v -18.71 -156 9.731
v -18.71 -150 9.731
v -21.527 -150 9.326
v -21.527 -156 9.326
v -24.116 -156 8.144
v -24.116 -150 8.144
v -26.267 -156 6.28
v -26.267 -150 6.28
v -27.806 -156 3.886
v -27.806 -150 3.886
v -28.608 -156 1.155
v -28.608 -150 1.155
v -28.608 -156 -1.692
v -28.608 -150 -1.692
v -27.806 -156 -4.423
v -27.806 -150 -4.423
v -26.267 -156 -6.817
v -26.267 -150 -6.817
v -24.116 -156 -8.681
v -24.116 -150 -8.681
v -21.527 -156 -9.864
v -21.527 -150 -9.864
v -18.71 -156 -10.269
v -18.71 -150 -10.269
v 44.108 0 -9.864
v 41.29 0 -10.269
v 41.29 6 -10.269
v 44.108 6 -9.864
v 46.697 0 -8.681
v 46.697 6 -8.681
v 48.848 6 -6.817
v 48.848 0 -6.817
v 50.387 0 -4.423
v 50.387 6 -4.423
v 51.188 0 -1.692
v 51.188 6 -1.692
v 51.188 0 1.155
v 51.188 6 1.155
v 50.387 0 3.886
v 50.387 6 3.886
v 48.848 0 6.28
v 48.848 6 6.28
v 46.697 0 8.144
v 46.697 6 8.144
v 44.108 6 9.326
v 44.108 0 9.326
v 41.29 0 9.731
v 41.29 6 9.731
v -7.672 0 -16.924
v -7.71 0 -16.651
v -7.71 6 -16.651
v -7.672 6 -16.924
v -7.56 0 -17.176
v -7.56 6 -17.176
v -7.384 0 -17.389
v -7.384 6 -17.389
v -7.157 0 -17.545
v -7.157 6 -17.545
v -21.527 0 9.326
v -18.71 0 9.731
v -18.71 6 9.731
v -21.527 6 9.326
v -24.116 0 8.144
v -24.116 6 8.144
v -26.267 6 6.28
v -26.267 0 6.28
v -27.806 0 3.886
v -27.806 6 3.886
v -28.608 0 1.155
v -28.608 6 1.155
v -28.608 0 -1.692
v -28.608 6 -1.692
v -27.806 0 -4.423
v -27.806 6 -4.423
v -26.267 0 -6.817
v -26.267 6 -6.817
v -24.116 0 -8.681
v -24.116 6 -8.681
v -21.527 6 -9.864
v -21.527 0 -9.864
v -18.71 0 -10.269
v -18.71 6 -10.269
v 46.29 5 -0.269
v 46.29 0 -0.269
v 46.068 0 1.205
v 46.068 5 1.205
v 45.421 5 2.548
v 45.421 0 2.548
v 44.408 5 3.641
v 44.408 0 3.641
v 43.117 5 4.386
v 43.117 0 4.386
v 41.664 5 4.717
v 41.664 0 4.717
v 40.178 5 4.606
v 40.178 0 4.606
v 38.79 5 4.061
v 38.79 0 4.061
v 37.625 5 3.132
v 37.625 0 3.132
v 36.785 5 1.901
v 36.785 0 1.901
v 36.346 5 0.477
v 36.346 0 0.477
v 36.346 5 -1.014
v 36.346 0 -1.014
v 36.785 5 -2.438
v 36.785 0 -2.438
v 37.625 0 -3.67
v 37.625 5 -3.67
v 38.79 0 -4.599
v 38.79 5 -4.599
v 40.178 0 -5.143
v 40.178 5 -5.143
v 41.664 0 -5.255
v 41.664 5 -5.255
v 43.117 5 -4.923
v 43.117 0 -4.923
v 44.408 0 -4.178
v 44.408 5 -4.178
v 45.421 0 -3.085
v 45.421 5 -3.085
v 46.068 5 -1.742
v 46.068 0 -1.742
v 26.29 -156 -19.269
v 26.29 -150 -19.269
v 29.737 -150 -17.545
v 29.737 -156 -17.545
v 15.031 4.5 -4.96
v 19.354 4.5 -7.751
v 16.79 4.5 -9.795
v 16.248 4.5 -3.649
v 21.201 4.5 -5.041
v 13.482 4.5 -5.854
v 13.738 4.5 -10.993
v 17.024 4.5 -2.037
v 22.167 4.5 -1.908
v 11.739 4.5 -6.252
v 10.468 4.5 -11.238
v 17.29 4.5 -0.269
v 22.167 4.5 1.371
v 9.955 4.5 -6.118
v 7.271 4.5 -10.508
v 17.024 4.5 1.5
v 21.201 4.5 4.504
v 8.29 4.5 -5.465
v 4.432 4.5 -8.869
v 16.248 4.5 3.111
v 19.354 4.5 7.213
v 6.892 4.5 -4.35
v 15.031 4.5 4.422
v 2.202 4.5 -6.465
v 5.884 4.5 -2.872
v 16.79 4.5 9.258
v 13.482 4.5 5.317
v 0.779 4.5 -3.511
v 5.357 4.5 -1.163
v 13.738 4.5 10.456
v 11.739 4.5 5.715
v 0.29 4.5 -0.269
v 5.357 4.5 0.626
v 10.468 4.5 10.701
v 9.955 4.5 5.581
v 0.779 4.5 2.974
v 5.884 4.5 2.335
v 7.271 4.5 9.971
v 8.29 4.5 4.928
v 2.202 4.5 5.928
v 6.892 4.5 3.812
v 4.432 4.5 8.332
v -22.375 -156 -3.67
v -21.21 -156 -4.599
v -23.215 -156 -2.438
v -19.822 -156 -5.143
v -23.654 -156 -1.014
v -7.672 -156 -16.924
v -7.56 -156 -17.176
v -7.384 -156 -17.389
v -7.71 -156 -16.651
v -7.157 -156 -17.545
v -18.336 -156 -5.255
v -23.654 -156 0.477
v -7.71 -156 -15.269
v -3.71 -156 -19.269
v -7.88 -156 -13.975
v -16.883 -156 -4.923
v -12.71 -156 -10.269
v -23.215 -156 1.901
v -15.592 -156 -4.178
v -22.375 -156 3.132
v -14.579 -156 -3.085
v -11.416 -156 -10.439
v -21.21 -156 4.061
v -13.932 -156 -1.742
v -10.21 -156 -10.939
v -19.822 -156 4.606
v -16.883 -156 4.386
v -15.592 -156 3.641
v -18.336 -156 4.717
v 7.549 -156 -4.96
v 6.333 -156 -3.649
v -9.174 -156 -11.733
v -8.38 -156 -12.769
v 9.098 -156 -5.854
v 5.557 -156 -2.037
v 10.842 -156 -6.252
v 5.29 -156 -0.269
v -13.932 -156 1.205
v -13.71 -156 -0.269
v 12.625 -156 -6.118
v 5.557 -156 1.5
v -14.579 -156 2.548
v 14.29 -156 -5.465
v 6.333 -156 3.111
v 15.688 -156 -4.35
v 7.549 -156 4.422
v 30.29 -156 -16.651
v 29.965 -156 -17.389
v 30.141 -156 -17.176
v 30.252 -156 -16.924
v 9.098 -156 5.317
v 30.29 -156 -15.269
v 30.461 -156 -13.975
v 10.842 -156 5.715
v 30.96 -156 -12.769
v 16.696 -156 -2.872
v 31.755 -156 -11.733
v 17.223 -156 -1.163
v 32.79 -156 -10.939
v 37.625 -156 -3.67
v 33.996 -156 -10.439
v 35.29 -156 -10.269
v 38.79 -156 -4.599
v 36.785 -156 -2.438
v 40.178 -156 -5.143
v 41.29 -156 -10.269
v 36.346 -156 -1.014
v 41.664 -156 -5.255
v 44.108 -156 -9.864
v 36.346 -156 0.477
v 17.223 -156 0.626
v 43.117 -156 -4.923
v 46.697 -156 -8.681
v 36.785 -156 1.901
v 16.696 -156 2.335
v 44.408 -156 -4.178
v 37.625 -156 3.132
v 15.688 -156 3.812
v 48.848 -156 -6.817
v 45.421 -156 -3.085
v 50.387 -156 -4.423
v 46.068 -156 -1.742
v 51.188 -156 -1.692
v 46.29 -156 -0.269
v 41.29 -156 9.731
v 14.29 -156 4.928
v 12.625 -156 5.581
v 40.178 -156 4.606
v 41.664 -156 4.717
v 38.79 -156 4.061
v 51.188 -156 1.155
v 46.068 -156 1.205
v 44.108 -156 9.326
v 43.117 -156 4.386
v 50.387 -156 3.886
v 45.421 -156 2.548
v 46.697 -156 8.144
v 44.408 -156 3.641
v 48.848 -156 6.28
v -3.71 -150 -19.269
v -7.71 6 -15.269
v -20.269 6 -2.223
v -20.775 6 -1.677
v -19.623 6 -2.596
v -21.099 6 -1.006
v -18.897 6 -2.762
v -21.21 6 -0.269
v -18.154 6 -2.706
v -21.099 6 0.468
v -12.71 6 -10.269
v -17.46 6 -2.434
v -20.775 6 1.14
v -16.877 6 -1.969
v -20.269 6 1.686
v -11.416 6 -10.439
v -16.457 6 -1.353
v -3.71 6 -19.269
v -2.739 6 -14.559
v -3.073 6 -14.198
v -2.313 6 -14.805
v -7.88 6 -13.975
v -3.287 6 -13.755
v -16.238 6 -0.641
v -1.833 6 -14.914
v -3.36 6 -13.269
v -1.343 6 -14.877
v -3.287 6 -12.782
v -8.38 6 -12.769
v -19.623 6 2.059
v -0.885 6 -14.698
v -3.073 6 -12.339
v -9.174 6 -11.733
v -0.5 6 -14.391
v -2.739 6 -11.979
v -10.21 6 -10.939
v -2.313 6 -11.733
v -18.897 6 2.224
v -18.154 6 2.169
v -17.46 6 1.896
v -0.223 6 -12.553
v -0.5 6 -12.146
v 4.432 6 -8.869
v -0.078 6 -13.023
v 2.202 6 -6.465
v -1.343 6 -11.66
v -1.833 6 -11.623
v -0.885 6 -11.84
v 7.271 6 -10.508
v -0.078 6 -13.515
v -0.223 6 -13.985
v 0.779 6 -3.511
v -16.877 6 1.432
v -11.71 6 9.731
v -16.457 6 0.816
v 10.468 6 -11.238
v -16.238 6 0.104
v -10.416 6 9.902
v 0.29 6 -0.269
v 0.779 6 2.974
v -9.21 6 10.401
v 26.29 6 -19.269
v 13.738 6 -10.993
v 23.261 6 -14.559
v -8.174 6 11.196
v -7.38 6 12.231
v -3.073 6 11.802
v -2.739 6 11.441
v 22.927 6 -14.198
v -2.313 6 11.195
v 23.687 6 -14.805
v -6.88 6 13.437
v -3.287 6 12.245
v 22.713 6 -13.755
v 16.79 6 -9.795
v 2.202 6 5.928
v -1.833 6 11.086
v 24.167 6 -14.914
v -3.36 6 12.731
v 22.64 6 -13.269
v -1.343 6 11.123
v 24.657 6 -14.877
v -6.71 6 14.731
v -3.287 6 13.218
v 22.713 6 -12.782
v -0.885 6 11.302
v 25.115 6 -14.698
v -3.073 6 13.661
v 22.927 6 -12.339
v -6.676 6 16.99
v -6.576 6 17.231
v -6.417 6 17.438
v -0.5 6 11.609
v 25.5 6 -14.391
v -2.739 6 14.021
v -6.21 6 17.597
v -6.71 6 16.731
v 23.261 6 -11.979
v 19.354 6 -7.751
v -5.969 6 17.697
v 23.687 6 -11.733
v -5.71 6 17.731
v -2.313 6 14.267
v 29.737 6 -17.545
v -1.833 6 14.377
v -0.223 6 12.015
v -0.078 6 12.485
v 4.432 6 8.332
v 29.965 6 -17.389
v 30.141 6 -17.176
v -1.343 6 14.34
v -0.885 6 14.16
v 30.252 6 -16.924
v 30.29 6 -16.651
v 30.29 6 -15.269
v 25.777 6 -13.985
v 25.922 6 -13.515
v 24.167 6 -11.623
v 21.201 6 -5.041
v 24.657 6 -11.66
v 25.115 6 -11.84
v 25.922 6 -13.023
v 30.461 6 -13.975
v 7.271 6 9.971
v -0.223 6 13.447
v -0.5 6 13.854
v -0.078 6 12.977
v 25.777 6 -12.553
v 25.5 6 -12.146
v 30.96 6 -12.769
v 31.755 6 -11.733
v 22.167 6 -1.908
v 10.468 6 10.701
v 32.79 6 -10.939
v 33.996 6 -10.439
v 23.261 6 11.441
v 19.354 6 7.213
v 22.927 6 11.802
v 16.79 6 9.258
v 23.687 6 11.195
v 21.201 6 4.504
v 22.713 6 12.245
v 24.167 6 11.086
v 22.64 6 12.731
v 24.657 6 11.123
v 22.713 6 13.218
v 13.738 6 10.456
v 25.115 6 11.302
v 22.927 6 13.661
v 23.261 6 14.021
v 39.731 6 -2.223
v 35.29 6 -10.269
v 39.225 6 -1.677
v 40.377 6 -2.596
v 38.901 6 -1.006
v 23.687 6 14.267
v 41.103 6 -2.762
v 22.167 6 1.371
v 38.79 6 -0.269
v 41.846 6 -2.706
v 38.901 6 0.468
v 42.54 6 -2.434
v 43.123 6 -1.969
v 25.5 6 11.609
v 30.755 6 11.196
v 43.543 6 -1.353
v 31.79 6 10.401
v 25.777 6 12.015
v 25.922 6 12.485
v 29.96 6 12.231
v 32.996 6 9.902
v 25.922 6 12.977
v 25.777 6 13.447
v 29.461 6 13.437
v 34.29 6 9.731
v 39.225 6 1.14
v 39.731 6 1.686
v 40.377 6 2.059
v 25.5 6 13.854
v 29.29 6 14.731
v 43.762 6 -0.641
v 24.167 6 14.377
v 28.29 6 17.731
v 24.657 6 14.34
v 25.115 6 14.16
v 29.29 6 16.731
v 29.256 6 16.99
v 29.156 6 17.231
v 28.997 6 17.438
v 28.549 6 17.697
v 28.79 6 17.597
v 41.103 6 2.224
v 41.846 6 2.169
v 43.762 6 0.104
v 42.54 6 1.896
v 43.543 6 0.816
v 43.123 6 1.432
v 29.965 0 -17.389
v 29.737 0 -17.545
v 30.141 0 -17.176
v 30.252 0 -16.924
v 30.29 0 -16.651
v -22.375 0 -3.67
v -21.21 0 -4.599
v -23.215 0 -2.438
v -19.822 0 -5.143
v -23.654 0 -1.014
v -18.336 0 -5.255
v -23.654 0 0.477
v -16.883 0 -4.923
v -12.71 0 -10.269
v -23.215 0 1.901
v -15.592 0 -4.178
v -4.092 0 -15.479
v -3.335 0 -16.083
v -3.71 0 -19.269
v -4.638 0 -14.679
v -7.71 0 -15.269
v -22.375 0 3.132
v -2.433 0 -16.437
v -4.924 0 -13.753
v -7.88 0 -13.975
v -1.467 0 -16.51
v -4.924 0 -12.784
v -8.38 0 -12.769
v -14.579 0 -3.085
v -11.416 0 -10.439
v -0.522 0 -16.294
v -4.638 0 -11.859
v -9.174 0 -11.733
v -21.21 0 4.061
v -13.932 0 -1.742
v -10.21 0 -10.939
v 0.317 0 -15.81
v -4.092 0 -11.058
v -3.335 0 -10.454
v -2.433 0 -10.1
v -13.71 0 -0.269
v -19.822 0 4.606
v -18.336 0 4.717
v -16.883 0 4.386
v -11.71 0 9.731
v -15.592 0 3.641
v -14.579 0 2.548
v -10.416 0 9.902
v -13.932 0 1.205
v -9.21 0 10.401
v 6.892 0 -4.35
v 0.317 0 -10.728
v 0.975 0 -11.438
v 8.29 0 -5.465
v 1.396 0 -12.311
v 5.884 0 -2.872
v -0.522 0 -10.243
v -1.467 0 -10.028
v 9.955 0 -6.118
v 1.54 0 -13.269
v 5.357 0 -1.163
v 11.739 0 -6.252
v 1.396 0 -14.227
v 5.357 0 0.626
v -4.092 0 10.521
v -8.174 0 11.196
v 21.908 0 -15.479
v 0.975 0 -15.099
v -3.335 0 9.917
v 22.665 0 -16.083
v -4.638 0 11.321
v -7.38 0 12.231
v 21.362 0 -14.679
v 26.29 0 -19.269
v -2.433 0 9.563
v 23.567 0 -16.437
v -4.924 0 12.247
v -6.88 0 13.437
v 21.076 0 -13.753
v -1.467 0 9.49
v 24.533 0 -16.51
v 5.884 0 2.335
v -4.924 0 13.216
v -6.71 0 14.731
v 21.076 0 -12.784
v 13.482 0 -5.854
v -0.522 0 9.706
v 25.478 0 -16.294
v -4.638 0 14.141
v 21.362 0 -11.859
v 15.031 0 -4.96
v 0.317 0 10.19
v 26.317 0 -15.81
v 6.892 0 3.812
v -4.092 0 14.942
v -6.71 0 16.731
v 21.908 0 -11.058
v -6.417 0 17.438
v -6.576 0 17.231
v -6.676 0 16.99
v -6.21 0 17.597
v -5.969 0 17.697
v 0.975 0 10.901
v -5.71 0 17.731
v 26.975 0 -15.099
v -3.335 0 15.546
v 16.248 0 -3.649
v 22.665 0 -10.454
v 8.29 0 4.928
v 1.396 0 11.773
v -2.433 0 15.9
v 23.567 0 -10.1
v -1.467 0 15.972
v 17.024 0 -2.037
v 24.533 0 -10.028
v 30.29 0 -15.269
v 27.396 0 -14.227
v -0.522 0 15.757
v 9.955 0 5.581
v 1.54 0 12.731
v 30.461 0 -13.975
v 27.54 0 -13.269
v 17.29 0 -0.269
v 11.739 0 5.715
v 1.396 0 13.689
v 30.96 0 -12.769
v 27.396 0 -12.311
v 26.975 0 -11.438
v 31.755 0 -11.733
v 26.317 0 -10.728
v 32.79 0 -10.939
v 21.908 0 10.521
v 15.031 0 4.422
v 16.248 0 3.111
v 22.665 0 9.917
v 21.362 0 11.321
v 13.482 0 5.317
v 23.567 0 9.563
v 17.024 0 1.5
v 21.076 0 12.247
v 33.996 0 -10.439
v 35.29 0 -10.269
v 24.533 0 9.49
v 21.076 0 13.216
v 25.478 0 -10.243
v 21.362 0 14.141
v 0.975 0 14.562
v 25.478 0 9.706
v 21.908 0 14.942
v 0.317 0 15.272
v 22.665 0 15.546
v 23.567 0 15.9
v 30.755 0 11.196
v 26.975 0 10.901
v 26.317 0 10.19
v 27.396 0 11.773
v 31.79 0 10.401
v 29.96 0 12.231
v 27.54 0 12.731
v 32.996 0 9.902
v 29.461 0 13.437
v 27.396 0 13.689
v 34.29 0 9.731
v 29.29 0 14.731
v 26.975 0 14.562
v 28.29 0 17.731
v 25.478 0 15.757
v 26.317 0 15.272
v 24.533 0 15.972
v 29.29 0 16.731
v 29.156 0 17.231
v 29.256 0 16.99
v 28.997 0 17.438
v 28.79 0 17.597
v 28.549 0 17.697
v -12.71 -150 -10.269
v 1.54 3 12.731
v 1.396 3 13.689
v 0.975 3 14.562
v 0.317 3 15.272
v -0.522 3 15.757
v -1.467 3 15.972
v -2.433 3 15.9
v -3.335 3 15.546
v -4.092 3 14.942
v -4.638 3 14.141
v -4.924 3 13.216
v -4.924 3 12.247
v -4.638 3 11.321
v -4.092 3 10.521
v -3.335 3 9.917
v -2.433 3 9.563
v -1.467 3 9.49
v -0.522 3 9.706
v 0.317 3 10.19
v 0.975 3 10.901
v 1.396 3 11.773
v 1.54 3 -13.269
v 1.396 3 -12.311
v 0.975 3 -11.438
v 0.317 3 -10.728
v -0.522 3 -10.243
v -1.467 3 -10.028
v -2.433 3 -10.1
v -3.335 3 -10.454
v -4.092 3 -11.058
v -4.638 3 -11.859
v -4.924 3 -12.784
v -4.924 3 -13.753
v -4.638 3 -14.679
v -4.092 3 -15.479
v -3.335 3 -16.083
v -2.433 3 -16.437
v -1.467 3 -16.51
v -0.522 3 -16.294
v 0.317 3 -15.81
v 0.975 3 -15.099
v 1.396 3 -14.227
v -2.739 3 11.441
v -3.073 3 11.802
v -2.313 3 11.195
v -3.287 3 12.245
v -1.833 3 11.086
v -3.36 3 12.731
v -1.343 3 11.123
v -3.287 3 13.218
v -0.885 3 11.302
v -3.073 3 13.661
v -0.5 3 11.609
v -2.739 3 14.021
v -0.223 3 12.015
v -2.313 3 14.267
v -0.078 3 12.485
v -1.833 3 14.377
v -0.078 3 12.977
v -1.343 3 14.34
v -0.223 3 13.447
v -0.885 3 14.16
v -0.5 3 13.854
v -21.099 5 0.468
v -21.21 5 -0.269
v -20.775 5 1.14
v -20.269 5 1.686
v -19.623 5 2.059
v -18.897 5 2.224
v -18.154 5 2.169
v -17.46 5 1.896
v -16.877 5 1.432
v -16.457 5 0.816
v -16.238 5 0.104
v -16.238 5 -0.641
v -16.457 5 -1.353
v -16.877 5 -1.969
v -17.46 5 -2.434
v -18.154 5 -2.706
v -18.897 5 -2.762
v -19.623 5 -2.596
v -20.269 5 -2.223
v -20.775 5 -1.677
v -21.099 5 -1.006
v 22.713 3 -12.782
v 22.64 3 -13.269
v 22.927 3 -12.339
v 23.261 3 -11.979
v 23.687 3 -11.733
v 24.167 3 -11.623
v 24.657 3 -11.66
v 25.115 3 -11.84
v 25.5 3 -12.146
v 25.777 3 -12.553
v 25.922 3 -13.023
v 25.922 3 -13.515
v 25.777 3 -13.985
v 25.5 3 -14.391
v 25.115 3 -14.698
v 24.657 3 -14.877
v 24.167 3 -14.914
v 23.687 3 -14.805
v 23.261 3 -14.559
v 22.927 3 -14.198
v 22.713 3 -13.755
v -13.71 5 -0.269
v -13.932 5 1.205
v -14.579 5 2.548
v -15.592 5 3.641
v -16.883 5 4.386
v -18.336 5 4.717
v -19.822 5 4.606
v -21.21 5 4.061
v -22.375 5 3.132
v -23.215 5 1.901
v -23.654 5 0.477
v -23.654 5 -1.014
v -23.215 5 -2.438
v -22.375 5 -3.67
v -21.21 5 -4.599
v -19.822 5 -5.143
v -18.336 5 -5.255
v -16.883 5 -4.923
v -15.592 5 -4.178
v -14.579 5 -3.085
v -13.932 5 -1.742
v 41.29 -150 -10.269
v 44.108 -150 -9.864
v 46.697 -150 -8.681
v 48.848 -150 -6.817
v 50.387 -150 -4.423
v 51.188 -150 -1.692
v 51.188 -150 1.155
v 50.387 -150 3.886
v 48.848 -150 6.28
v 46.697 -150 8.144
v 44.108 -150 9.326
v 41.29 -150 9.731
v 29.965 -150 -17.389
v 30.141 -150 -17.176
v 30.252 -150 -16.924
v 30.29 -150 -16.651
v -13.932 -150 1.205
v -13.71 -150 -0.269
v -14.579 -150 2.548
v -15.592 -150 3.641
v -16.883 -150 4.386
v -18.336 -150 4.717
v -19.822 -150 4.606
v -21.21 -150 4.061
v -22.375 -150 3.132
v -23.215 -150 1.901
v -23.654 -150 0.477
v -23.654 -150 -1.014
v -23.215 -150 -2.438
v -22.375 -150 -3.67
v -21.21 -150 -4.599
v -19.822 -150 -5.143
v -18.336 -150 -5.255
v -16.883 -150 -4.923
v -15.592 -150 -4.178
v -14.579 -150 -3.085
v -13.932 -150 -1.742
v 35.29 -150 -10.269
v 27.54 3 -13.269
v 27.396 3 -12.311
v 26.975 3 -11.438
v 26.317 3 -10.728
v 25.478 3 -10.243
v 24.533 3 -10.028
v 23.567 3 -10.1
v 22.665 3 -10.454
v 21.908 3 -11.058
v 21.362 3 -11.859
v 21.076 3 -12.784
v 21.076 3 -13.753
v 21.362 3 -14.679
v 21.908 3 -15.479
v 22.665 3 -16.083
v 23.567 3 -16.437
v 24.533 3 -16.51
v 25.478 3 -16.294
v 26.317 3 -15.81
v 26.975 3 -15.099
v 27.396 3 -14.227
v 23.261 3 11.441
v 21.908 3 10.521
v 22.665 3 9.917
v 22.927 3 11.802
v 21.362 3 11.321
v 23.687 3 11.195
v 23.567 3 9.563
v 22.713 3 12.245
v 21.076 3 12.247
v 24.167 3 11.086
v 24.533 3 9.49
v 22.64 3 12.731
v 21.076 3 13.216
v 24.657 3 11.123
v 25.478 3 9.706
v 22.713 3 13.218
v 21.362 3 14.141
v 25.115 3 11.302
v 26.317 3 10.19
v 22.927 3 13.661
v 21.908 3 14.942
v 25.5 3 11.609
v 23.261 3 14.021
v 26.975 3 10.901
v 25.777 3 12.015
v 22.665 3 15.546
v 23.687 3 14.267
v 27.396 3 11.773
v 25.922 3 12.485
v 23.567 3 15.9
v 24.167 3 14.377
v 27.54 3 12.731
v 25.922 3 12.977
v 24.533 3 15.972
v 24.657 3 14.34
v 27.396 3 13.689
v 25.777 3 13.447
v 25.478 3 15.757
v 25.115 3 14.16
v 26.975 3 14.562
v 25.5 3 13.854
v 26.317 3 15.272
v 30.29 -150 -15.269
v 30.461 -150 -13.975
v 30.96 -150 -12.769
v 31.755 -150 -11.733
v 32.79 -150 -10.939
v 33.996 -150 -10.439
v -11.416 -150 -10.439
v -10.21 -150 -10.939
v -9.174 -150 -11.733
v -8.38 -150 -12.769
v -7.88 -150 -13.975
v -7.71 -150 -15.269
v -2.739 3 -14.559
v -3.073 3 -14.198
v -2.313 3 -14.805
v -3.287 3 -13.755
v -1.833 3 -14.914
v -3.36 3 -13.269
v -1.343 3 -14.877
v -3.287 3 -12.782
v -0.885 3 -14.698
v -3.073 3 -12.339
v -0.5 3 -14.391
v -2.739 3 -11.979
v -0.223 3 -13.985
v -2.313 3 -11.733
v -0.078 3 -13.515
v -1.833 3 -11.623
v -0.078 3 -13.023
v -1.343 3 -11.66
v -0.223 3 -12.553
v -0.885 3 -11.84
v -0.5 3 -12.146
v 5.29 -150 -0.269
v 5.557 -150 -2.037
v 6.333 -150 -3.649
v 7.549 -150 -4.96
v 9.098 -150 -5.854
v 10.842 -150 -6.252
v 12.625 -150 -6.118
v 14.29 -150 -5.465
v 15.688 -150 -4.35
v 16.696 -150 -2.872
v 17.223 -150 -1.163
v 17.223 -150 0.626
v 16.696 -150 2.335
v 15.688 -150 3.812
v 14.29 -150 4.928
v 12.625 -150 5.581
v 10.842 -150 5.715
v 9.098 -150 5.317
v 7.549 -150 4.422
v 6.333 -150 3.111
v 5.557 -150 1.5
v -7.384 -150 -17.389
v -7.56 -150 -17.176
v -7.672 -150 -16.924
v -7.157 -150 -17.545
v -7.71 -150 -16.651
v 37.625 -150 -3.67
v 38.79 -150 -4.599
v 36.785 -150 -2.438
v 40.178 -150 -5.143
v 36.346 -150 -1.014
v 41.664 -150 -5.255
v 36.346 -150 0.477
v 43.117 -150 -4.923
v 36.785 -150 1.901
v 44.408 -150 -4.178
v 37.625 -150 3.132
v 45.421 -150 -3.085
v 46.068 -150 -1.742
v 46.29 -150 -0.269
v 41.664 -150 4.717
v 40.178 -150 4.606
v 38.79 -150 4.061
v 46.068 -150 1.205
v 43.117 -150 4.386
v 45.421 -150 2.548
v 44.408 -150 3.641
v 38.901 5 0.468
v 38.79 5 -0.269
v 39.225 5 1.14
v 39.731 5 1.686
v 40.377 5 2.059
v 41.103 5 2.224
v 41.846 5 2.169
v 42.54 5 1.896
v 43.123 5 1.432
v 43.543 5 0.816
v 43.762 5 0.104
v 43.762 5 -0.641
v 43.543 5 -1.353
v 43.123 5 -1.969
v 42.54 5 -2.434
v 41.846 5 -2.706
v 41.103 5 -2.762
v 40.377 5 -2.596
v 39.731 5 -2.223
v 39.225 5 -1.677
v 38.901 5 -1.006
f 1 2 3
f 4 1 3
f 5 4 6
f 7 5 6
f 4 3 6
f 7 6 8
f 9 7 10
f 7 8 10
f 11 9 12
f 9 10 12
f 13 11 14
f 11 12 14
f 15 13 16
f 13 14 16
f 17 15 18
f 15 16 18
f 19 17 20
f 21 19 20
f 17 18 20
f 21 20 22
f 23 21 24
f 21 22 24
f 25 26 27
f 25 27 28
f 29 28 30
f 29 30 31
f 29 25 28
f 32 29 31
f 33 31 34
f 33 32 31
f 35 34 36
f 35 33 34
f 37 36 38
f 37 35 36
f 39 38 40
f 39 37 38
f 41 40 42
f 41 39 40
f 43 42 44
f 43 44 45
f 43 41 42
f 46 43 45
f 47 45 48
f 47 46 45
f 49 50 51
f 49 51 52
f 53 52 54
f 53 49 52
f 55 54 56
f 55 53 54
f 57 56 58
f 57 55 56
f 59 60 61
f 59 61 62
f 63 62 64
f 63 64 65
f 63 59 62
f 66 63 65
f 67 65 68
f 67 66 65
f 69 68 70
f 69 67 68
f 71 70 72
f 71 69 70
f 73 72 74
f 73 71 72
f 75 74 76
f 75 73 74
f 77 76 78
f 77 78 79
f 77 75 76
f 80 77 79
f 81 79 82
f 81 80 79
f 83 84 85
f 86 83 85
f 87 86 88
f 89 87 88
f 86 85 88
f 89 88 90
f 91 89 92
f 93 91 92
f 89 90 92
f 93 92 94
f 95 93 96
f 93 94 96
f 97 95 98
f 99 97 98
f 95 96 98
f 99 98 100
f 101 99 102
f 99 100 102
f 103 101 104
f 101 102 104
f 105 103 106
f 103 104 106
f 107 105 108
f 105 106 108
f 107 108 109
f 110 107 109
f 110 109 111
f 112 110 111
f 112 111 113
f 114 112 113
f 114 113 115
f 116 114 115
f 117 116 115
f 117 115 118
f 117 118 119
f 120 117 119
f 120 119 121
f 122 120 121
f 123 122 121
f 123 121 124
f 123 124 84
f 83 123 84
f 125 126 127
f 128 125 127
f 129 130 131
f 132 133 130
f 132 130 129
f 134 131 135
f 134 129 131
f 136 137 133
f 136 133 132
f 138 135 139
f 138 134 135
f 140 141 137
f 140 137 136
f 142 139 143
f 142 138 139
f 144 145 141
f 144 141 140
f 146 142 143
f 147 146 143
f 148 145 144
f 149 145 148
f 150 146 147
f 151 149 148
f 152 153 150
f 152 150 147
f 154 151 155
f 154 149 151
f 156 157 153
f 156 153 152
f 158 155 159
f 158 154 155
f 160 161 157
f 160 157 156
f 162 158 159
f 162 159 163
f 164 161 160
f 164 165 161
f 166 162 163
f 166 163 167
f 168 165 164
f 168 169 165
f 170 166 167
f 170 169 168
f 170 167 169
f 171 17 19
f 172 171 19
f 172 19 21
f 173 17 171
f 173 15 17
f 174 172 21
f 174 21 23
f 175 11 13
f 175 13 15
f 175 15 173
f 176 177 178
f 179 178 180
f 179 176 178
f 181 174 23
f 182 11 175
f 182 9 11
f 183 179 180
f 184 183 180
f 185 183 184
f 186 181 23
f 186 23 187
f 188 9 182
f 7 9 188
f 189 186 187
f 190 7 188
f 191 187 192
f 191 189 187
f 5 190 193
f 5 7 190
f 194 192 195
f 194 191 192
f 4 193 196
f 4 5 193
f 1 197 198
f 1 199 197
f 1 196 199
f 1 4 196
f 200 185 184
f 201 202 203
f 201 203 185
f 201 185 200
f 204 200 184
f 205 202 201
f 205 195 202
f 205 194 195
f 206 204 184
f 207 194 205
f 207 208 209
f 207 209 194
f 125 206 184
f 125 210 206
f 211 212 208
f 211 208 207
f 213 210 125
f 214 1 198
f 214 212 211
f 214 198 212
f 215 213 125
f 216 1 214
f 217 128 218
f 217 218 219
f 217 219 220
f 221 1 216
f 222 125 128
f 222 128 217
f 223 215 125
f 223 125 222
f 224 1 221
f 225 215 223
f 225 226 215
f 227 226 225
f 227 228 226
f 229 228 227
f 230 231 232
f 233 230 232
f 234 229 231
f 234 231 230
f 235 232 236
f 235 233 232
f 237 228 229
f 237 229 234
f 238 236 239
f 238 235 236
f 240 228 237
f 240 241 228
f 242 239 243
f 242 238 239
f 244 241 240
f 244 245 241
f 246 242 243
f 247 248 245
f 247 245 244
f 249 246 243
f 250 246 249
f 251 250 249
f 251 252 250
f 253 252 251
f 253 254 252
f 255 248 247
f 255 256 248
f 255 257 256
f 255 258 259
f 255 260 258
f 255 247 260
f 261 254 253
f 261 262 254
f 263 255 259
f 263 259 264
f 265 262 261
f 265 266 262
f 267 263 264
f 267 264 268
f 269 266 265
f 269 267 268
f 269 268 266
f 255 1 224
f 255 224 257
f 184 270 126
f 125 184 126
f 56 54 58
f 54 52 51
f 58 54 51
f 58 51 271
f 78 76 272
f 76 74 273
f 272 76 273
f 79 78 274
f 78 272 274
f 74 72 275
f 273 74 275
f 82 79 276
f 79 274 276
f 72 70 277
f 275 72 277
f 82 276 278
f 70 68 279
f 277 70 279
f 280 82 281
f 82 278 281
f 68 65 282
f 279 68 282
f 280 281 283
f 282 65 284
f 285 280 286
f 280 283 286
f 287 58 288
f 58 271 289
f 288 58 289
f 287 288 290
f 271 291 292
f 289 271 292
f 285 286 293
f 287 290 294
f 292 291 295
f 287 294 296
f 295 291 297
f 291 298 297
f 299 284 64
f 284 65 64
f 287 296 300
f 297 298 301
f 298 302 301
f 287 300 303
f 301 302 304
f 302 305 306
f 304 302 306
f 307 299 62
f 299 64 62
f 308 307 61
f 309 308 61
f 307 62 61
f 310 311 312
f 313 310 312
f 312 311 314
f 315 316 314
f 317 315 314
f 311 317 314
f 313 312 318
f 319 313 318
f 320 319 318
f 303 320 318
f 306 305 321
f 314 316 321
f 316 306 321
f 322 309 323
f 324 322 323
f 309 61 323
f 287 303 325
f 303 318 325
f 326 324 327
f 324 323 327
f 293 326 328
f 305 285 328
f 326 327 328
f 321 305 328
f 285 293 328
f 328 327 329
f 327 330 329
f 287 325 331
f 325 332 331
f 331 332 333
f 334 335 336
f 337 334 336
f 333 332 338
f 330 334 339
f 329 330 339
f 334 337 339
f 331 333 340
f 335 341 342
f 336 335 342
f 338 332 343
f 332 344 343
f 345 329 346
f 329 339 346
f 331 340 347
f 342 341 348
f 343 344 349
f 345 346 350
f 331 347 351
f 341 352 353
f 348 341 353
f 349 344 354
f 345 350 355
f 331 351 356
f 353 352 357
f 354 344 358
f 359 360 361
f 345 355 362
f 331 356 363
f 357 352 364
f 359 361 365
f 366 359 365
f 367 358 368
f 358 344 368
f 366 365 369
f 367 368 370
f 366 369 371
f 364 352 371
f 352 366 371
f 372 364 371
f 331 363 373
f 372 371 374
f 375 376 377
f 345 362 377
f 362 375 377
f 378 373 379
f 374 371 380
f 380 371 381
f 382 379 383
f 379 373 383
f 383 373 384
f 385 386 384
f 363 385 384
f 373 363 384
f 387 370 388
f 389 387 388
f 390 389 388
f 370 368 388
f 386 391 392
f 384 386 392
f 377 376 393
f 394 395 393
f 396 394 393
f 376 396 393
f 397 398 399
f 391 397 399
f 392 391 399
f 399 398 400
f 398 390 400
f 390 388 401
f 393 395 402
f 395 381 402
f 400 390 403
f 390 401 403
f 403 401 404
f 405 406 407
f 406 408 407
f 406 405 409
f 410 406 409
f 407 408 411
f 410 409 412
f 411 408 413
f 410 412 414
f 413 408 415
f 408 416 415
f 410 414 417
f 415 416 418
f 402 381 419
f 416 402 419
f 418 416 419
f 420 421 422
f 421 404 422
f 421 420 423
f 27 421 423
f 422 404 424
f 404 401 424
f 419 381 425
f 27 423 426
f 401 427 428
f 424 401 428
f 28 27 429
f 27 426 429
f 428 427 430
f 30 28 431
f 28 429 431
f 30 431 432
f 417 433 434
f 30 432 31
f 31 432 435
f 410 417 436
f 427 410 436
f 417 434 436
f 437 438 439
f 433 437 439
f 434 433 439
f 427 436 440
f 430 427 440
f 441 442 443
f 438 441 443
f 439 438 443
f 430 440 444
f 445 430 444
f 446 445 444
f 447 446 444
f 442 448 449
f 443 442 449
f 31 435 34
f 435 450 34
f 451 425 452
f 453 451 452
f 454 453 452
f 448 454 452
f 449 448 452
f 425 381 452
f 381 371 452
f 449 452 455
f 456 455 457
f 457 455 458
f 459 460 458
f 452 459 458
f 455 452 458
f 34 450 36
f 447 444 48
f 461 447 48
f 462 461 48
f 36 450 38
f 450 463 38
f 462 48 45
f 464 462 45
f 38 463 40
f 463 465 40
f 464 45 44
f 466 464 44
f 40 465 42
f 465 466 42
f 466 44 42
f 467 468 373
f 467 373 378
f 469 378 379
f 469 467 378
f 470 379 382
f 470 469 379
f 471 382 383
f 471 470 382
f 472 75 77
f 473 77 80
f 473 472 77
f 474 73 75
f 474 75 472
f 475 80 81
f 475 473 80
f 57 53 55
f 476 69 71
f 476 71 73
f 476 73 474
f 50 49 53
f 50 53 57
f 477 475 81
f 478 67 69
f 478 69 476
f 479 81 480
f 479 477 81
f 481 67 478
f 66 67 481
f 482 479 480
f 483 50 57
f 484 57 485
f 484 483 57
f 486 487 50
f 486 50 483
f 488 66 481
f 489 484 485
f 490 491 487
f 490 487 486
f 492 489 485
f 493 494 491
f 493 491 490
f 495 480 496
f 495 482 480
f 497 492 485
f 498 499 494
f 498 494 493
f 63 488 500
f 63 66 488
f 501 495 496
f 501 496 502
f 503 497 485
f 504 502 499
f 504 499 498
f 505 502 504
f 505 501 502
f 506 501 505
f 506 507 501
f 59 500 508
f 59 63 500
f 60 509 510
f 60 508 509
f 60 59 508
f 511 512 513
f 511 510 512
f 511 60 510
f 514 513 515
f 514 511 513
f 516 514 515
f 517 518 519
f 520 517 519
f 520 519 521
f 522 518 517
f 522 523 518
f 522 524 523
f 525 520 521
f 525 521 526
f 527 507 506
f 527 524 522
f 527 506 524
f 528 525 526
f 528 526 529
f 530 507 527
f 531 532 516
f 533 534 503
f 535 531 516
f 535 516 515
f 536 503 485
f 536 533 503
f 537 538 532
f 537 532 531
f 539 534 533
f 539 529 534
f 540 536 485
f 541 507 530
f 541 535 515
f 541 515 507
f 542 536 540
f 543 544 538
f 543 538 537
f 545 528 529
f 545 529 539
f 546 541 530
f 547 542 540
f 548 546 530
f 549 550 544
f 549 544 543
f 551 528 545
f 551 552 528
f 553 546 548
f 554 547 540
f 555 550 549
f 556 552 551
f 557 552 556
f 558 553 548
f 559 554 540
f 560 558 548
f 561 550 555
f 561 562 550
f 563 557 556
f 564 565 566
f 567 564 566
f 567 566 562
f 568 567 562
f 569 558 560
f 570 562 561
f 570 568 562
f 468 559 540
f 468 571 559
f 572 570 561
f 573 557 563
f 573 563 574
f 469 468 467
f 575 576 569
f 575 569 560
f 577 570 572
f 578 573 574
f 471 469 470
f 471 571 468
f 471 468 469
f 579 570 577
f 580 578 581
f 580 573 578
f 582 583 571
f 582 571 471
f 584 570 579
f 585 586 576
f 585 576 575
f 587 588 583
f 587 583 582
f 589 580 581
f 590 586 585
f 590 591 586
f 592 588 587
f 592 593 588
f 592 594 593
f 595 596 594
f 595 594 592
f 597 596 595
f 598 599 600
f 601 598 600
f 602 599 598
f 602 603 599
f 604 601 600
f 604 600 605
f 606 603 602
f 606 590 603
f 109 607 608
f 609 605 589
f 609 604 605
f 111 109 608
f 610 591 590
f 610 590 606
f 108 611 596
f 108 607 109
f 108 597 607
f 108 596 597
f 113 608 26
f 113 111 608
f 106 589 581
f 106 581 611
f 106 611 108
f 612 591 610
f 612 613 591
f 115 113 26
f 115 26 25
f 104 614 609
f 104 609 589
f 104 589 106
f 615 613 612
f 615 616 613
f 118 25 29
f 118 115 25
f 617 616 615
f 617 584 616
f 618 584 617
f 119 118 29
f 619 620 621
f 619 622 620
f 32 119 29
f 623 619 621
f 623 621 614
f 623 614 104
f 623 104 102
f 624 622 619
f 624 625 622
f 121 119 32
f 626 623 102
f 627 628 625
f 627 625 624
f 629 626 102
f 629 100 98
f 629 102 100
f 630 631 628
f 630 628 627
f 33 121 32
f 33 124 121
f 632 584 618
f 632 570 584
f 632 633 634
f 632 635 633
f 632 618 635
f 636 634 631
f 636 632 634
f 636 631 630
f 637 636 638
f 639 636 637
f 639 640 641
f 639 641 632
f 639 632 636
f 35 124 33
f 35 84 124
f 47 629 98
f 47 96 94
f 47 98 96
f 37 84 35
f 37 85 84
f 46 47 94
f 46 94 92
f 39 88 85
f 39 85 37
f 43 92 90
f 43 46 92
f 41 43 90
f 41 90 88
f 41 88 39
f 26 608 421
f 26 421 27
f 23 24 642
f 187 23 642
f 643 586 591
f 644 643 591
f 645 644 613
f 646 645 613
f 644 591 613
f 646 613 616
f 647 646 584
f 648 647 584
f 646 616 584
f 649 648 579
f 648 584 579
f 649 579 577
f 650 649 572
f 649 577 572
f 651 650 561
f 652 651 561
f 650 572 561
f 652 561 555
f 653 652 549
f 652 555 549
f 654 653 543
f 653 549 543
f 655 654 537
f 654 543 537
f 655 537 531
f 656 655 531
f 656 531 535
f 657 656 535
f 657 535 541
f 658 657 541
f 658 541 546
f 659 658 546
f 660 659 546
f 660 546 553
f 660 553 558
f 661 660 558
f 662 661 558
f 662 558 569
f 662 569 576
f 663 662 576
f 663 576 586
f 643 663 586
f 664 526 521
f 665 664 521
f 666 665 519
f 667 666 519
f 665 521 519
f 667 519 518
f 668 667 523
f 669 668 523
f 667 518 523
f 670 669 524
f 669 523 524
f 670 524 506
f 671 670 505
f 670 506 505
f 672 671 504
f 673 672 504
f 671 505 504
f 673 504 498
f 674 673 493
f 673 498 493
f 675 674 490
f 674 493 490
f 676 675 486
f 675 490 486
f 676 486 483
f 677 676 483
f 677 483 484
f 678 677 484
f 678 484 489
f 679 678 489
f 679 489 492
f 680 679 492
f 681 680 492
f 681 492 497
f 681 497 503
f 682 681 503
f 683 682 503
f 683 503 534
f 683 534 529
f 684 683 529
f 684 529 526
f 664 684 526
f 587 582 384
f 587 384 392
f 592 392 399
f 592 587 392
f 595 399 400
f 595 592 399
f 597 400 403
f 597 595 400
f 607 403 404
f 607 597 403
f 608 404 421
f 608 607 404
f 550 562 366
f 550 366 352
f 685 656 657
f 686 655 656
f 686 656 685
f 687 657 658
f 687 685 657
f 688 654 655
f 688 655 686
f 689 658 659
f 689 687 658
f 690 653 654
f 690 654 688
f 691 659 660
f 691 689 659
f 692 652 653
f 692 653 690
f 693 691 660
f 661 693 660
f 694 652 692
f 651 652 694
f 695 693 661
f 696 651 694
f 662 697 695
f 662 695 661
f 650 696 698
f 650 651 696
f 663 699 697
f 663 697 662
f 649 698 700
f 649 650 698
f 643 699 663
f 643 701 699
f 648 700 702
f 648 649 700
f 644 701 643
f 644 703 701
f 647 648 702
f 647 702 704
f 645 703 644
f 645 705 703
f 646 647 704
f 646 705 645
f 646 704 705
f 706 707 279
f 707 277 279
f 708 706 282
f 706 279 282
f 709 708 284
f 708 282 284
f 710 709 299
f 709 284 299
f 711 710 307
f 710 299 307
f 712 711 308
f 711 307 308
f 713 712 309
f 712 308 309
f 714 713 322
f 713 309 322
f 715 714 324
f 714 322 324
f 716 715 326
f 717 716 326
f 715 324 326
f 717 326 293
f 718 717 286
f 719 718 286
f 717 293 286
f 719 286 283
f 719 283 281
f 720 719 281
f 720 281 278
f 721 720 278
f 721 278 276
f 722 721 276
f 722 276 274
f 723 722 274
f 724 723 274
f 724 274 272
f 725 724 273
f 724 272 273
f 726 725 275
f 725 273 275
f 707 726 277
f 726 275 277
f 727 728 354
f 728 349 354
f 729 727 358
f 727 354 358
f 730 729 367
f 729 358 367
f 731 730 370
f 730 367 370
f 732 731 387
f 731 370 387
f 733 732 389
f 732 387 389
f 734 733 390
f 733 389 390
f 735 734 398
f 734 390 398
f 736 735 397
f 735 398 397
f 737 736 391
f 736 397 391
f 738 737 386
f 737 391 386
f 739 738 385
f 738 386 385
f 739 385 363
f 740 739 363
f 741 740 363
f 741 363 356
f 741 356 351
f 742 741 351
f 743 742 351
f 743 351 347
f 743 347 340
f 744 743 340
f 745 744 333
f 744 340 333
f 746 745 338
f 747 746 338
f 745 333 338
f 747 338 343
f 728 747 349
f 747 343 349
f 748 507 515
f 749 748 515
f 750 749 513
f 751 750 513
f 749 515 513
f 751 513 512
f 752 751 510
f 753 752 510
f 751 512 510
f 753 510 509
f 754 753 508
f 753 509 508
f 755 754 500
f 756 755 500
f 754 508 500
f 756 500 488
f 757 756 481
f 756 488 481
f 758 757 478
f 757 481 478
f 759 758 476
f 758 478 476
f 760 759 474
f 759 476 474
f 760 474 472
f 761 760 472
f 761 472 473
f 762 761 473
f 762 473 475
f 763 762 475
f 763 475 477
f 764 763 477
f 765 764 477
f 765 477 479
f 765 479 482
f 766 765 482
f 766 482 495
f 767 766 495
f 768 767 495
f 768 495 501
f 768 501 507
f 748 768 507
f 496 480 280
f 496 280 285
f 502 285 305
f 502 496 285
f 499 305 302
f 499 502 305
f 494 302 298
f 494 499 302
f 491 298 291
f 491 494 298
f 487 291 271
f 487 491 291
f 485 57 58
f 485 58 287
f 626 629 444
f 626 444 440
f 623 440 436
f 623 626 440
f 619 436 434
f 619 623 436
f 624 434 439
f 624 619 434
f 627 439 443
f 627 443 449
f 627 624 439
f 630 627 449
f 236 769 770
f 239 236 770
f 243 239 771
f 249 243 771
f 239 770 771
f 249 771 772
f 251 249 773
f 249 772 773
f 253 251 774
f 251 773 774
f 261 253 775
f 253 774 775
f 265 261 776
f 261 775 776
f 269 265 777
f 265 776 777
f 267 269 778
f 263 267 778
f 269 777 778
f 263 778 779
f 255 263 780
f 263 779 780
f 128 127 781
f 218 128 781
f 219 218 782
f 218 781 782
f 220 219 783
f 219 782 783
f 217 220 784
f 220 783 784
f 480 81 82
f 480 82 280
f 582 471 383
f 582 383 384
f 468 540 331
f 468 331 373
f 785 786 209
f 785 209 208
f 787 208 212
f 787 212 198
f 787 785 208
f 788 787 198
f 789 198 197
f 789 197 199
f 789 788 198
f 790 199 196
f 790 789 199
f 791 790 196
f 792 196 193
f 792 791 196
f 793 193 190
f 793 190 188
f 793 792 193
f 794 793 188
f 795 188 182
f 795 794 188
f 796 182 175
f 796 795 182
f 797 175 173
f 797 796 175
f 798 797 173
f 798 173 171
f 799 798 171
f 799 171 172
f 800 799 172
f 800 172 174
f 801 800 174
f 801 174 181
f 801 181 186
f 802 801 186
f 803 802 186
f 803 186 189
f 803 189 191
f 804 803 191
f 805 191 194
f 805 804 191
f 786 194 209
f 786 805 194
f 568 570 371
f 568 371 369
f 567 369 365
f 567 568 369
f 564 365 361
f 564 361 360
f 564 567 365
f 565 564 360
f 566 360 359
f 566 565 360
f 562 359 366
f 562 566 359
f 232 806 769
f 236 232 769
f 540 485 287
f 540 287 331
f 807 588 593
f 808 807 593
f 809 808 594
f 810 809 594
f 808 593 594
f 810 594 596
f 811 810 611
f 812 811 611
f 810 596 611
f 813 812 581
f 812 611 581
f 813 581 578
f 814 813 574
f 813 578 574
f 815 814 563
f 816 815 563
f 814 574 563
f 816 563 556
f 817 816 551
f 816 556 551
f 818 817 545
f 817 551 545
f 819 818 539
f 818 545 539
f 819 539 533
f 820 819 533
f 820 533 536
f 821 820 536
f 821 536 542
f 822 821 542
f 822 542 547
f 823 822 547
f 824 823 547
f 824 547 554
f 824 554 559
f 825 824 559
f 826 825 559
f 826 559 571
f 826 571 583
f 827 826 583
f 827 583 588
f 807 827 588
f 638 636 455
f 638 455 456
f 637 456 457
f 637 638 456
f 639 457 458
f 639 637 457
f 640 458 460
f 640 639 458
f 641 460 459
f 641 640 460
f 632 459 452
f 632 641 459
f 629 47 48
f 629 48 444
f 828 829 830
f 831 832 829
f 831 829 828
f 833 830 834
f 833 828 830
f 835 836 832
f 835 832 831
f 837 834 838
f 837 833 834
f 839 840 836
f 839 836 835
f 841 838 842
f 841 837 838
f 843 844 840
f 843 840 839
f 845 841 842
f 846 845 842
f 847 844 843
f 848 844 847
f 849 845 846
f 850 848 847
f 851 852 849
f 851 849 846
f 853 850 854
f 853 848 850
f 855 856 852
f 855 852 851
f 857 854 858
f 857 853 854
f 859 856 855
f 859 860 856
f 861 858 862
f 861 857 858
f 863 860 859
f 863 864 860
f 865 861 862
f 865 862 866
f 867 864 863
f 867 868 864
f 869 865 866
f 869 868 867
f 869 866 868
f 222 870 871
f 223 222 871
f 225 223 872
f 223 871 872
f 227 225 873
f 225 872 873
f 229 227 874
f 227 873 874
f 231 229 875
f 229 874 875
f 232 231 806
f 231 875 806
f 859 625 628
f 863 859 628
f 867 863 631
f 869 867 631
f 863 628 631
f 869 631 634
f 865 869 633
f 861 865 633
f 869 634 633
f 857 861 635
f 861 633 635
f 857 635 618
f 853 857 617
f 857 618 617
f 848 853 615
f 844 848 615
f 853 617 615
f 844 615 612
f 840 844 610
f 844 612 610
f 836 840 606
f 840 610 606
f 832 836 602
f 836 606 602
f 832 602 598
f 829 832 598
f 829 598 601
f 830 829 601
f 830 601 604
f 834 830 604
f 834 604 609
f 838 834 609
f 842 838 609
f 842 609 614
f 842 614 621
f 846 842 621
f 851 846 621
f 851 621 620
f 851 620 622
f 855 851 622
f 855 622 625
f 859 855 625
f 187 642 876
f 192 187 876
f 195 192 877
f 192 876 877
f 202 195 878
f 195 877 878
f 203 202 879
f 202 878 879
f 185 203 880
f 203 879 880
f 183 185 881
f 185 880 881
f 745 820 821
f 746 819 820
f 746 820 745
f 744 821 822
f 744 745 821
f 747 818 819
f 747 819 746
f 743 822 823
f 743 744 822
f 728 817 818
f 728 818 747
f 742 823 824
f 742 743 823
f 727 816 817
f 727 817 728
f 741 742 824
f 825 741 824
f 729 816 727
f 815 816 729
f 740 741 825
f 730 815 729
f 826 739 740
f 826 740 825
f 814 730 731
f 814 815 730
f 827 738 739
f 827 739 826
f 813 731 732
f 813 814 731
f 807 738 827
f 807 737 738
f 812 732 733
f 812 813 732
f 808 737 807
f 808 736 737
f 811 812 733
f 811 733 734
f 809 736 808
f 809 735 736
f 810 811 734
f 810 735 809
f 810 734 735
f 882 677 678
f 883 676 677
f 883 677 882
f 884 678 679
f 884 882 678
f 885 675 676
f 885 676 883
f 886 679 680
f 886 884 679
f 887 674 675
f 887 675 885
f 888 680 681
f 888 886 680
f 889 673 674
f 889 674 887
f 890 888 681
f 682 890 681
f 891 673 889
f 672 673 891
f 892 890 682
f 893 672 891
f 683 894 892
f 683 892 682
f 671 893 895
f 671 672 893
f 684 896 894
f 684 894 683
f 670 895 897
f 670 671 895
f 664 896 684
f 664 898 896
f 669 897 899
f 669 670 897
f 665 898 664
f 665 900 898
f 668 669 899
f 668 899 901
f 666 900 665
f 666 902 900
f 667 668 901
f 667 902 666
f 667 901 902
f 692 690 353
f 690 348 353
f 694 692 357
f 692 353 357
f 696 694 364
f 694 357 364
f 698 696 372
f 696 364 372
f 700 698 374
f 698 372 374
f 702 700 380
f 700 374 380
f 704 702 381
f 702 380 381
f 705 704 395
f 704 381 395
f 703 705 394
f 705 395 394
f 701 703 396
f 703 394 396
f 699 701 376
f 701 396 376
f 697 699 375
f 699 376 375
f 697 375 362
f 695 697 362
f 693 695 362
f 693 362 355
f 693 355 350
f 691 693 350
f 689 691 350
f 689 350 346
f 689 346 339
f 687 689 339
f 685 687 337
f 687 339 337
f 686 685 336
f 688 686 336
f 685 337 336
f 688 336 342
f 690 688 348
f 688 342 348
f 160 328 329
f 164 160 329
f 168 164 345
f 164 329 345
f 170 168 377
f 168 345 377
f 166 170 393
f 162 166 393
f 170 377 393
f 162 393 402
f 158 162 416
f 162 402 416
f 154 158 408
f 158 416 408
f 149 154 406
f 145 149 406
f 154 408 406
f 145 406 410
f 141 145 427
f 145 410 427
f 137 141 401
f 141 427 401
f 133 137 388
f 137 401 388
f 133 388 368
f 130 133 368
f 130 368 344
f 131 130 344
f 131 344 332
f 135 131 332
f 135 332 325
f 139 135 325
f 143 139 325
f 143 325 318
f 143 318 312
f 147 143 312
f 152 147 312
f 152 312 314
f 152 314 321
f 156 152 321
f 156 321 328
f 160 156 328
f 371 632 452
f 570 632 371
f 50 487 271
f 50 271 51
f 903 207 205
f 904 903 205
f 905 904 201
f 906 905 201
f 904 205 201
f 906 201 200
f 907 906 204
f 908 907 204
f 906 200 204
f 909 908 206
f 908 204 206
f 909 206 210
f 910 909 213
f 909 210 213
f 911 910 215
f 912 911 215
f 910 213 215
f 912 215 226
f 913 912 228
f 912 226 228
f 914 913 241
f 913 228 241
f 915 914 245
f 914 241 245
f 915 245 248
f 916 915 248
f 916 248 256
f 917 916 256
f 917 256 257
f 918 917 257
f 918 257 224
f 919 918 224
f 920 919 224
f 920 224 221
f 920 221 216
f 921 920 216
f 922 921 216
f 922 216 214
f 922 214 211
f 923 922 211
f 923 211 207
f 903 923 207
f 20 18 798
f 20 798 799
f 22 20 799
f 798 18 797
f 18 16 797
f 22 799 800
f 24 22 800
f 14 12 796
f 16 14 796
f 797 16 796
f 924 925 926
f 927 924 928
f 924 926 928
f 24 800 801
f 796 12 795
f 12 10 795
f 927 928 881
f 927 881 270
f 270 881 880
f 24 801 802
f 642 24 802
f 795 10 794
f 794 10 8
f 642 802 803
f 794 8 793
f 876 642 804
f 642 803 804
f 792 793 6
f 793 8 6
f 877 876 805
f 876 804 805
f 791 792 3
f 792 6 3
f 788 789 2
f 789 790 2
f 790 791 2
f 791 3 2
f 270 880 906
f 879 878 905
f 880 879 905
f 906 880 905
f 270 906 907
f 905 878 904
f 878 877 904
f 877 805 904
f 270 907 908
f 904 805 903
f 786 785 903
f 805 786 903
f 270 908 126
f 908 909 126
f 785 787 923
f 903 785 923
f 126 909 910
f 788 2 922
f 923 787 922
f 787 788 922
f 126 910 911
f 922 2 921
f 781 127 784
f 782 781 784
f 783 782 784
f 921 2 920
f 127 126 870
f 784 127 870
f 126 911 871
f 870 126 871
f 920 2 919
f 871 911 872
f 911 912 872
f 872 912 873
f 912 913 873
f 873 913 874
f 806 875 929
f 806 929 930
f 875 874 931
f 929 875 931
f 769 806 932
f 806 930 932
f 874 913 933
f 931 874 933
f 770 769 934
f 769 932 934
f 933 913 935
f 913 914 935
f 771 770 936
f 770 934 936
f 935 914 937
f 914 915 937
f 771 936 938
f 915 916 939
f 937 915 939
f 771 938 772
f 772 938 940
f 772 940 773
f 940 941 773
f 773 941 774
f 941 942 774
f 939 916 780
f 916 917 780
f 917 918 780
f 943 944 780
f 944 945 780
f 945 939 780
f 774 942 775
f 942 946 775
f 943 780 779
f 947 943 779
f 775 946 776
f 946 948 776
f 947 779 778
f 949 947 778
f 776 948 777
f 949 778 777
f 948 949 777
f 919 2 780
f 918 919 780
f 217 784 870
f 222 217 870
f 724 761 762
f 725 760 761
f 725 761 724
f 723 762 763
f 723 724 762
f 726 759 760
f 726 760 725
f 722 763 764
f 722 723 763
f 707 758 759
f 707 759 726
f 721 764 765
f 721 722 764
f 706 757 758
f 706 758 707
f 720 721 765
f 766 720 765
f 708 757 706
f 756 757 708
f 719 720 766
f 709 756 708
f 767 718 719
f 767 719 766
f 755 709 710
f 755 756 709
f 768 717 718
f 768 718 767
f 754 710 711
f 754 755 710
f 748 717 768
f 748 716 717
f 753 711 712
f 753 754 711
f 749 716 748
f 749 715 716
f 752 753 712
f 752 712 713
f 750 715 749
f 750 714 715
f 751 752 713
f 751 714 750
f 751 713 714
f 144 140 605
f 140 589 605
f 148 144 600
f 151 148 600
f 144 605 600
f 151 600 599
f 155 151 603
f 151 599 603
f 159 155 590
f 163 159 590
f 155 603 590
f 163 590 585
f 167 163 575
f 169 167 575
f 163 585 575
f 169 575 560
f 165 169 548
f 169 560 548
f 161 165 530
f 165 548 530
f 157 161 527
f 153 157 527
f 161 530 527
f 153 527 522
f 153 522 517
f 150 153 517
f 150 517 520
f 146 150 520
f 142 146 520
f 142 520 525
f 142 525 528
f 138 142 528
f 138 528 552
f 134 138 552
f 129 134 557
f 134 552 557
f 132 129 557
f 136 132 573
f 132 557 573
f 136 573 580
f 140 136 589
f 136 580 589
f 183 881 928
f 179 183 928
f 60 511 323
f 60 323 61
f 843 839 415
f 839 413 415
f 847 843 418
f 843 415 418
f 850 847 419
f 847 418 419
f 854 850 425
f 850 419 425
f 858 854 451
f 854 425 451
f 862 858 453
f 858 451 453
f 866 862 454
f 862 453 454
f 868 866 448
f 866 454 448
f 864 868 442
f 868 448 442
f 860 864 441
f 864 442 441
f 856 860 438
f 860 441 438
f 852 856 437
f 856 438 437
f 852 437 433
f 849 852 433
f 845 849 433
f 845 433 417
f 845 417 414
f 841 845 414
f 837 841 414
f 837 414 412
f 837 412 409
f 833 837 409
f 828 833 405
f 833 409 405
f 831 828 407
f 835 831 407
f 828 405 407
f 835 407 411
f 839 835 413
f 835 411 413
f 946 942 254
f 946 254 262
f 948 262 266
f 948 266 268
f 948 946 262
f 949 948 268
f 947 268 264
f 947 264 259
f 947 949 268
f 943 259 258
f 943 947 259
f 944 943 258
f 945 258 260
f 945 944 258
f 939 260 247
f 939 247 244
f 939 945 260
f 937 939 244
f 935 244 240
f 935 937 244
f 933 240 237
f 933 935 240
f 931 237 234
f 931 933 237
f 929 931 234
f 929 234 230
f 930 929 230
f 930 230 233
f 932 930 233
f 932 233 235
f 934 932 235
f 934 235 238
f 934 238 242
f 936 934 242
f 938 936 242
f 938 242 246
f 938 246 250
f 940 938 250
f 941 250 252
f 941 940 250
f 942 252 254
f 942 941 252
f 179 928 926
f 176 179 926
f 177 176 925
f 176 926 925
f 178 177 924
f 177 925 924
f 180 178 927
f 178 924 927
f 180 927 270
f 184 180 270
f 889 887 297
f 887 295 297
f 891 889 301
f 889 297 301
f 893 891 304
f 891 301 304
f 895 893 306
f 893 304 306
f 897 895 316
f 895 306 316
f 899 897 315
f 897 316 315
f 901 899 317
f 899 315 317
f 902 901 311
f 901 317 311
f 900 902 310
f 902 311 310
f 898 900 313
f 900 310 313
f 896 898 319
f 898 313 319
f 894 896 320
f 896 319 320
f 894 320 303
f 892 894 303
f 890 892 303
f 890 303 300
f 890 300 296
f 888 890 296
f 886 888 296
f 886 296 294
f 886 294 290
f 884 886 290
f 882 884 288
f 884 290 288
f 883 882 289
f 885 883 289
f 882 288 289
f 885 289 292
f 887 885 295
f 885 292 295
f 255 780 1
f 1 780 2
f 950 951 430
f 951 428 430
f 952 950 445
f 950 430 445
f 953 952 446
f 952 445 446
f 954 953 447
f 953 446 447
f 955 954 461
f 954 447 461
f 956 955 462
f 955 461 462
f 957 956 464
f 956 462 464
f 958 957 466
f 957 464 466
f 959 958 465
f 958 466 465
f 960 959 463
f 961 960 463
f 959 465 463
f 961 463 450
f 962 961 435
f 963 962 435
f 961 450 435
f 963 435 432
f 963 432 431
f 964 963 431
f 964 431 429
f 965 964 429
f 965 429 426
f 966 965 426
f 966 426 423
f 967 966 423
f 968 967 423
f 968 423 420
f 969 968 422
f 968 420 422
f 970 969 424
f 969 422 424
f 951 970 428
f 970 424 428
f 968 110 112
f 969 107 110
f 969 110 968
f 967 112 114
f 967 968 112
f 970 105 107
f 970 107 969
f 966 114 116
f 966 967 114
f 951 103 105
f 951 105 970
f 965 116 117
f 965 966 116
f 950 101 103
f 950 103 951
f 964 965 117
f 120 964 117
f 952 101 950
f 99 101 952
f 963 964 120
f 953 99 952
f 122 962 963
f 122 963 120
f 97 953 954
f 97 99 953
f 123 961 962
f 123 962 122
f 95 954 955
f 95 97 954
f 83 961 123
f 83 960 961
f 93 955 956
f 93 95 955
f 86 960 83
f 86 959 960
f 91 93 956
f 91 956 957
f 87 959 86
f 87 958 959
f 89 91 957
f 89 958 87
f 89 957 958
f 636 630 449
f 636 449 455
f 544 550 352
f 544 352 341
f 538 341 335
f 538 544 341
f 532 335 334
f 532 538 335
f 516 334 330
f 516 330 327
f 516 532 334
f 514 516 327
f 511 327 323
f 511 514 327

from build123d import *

# Parameters (mm, degrees)
F0_R           = 5
F1_DEPTH       = 6
F4_D           = 3.3
F4_DEPTH       = 10.1
F4_CBORE_D     = 6.5
F4_CBORE_DEPTH = 3
F4_TIP         = 0.9914200214
F5_D           = 5
F5_DEPTH       = 10.1
F5_CBORE_D     = 10
F5_CBORE_DEPTH = 5
F5_TIP         = 1.5021515476
F3_R           = 5
F6_DEPTH       = 6
F7_D           = 12
F7_DEPTH       = 10.1
F7_TIP         = 3.6051637142
F9_D           = 12
F9_DEPTH       = 10.1
F9_CBORE_D     = 22
F9_CBORE_DEPTH = 1.5
F9_TIP         = 3.6051637142


with BuildPart() as f1:
    # F0 (on Front) → F1 (new body)
    with BuildSketch(Plane.XZ):
        with BuildLine():
            Line((-11.7098134421, 9.7313608133), (-18.7098134421, 9.7313608133))
            ThreePointArc((-18.7098134421, 9.7313608133), (-28.7098134421, -0.2686391867), (-18.7098134421, -10.2686391867))
            Line((-18.7098134421, -10.2686391867), (-12.7098134421, -10.2686391867))
            ThreePointArc((-12.7098134421, -10.2686391867), (-9.1742795361, -11.7331052807), (-7.7098134421, -15.2686391867))
            Line((-7.7098134421, -15.2686391867), (-7.7098134421, -16.6506051979))
            ThreePointArc((-7.7098134421, -16.6506051979), (-7.5604642504, -17.17633631), (-7.1570270376, -17.5450323889))
            Line((-7.1570270376, -17.5450323889), (-3.7098134421, -19.2686391867))
            Line((-3.7098134421, -19.2686391867), (26.2901865579, -19.2686391867))
            Line((26.2901865579, -19.2686391867), (29.7374001534, -17.5450323889))
            ThreePointArc((29.7374001534, -17.5450323889), (30.1408373663, -17.17633631), (30.2901865579, -16.6506051979))
            Line((30.2901865579, -16.6506051979), (30.2901865579, -15.2686391867))
            ThreePointArc((30.2901865579, -15.2686391867), (31.754652652, -11.7331052807), (35.2901865579, -10.2686391867))
            Line((35.2901865579, -10.2686391867), (41.2901865579, -10.2686391867))
            ThreePointArc((41.2901865579, -10.2686391867), (51.2901865579, -0.2686391867), (41.2901865579, 9.7313608133))
            Line((41.2901865579, 9.7313608133), (34.2901865579, 9.7313608133))
            ThreePointArc((34.2901865579, 9.7313608133), (30.754652652, 11.1958269074), (29.2901865579, 14.7313608133))
            Line((29.2901865579, 14.7313608133), (29.2901865579, 16.7313608133))
            ThreePointArc((29.2901865579, 16.7313608133), (28.9972933391, 17.4384675945), (28.2901865579, 17.7313608133))
            Line((28.2901865579, 17.7313608133), (-5.7098134421, 17.7313608133))
            ThreePointArc((-5.7098134421, 17.7313608133), (-6.4169202233, 17.4384675945), (-6.7098134421, 16.7313608133))
            Line((-6.7098134421, 16.7313608133), (-6.7098134421, 14.7313608133))
            ThreePointArc((-6.7098134421, 14.7313608133), (-8.1742795361, 11.1958269074), (-11.7098134421, 9.7313608133))
        make_face()
        with Locations((-18.7098134421, -0.2686391867)):
            Circle(F0_R, mode=Mode.SUBTRACT)
        with Locations((41.2901865579, -0.2686391867)):
            Circle(F0_R, mode=Mode.SUBTRACT)
        with Locations((-18.7098134421, -0.2686391867)):
            Circle(F0_R)
        with Locations((41.2901865579, -0.2686391867)):
            Circle(F0_R)
    extrude(amount=-F1_DEPTH)

    # F4
    with Locations(Plane.XZ):
        with Locations((-1.7098134421, 12.7313608133), (24.2901865579, 12.7313608133), (-1.7098134421, -13.2686391867), (24.2901865579, -13.2686391867)):
            CounterBoreHole(F4_D / 2, F4_CBORE_D / 2, F4_CBORE_DEPTH, depth=F4_DEPTH)
            with Locations((0, 0, -(F4_DEPTH + F4_TIP / 2))):  # 118° drill point
                Cone(0, F4_D / 2, F4_TIP, mode=Mode.SUBTRACT)

    # F5
    with Locations(Plane.XZ):
        with Locations((-18.7098134421, -0.2686391867), (41.2901865579, -0.2686391867)):
            CounterBoreHole(F5_D / 2, F5_CBORE_D / 2, F5_CBORE_DEPTH, depth=F5_DEPTH)
            with Locations((0, 0, -(F5_DEPTH + F5_TIP / 2))):  # 118° drill point
                Cone(0, F5_D / 2, F5_TIP, mode=Mode.SUBTRACT)

    # F9
    with Locations(Plane(origin=(0, 6, 0), x_dir=(-1, 0, 0), z_dir=(0, 1, 0))):
        with Locations((-11.2901865579, -0.2686391867)):
            CounterBoreHole(F9_D / 2, F9_CBORE_D / 2, F9_CBORE_DEPTH, depth=F9_DEPTH)
            with Locations((0, 0, -(F9_DEPTH + F9_TIP / 2))):  # 118° drill point
                Cone(0, F9_D / 2, F9_TIP, mode=Mode.SUBTRACT)


with BuildPart() as f6:
    # F3 (on offset) → F6 (new body)
    with BuildSketch(Plane.XZ.offset(150)):
        with BuildLine():
            Line((-7.1570270376, -17.5450323889), (-3.7098134421, -19.2686391867))
            Line((-3.7098134421, -19.2686391867), (26.2901865579, -19.2686391867))
            Line((26.2901865579, -19.2686391867), (29.7374001534, -17.5450323889))
            ThreePointArc((29.7374001534, -17.5450323889), (30.1408373663, -17.17633631), (30.2901865579, -16.6506051979))
            Line((30.2901865579, -16.6506051979), (30.2901865579, -15.2686391867))
            ThreePointArc((30.2901865579, -15.2686391867), (31.754652652, -11.7331052807), (35.2901865579, -10.2686391867))
            Line((35.2901865579, -10.2686391867), (41.2901865579, -10.2686391867))
            ThreePointArc((41.2901865579, -10.2686391867), (51.2901865579, -0.2686391867), (41.2901865579, 9.7313608133))
            Line((41.2901865579, 9.7313608133), (34.2901865579, 9.7313608133))
            Line((34.2901865579, 9.7313608133), (-11.7098134421, 9.7313608133))
            Line((-11.7098134421, 9.7313608133), (-18.7098134421, 9.7313608133))
            ThreePointArc((-18.7098134421, 9.7313608133), (-28.7098134421, -0.2686391867), (-18.7098134421, -10.2686391867))
            Line((-18.7098134421, -10.2686391867), (-12.7098134421, -10.2686391867))
            ThreePointArc((-12.7098134421, -10.2686391867), (-9.1742795361, -11.7331052807), (-7.7098134421, -15.2686391867))
            Line((-7.7098134421, -15.2686391867), (-7.7098134421, -16.6506051979))
            ThreePointArc((-7.7098134421, -16.6506051979), (-7.5604642504, -17.17633631), (-7.1570270376, -17.5450323889))
        make_face()
        with Locations((-18.7098134421, -0.2686391867)):
            Circle(F3_R, mode=Mode.SUBTRACT)
        with Locations((41.2901865579, -0.2686391867)):
            Circle(F3_R, mode=Mode.SUBTRACT)
    extrude(amount=F6_DEPTH)

    # F7
    with Locations(Plane(origin=(0, -150, 0), x_dir=(1, 0, 0), z_dir=(0, 1, 0))):
        with Locations((11.2901865579, 0.2686391867)):
            Hole(F7_D / 2, depth=F7_DEPTH)
            with Locations((0, 0, -(F7_DEPTH + F7_TIP / 2))):  # 118° drill point
                Cone(0, F7_D / 2, F7_TIP, mode=Mode.SUBTRACT)


solid = Compound([f1.part, f6.part])
